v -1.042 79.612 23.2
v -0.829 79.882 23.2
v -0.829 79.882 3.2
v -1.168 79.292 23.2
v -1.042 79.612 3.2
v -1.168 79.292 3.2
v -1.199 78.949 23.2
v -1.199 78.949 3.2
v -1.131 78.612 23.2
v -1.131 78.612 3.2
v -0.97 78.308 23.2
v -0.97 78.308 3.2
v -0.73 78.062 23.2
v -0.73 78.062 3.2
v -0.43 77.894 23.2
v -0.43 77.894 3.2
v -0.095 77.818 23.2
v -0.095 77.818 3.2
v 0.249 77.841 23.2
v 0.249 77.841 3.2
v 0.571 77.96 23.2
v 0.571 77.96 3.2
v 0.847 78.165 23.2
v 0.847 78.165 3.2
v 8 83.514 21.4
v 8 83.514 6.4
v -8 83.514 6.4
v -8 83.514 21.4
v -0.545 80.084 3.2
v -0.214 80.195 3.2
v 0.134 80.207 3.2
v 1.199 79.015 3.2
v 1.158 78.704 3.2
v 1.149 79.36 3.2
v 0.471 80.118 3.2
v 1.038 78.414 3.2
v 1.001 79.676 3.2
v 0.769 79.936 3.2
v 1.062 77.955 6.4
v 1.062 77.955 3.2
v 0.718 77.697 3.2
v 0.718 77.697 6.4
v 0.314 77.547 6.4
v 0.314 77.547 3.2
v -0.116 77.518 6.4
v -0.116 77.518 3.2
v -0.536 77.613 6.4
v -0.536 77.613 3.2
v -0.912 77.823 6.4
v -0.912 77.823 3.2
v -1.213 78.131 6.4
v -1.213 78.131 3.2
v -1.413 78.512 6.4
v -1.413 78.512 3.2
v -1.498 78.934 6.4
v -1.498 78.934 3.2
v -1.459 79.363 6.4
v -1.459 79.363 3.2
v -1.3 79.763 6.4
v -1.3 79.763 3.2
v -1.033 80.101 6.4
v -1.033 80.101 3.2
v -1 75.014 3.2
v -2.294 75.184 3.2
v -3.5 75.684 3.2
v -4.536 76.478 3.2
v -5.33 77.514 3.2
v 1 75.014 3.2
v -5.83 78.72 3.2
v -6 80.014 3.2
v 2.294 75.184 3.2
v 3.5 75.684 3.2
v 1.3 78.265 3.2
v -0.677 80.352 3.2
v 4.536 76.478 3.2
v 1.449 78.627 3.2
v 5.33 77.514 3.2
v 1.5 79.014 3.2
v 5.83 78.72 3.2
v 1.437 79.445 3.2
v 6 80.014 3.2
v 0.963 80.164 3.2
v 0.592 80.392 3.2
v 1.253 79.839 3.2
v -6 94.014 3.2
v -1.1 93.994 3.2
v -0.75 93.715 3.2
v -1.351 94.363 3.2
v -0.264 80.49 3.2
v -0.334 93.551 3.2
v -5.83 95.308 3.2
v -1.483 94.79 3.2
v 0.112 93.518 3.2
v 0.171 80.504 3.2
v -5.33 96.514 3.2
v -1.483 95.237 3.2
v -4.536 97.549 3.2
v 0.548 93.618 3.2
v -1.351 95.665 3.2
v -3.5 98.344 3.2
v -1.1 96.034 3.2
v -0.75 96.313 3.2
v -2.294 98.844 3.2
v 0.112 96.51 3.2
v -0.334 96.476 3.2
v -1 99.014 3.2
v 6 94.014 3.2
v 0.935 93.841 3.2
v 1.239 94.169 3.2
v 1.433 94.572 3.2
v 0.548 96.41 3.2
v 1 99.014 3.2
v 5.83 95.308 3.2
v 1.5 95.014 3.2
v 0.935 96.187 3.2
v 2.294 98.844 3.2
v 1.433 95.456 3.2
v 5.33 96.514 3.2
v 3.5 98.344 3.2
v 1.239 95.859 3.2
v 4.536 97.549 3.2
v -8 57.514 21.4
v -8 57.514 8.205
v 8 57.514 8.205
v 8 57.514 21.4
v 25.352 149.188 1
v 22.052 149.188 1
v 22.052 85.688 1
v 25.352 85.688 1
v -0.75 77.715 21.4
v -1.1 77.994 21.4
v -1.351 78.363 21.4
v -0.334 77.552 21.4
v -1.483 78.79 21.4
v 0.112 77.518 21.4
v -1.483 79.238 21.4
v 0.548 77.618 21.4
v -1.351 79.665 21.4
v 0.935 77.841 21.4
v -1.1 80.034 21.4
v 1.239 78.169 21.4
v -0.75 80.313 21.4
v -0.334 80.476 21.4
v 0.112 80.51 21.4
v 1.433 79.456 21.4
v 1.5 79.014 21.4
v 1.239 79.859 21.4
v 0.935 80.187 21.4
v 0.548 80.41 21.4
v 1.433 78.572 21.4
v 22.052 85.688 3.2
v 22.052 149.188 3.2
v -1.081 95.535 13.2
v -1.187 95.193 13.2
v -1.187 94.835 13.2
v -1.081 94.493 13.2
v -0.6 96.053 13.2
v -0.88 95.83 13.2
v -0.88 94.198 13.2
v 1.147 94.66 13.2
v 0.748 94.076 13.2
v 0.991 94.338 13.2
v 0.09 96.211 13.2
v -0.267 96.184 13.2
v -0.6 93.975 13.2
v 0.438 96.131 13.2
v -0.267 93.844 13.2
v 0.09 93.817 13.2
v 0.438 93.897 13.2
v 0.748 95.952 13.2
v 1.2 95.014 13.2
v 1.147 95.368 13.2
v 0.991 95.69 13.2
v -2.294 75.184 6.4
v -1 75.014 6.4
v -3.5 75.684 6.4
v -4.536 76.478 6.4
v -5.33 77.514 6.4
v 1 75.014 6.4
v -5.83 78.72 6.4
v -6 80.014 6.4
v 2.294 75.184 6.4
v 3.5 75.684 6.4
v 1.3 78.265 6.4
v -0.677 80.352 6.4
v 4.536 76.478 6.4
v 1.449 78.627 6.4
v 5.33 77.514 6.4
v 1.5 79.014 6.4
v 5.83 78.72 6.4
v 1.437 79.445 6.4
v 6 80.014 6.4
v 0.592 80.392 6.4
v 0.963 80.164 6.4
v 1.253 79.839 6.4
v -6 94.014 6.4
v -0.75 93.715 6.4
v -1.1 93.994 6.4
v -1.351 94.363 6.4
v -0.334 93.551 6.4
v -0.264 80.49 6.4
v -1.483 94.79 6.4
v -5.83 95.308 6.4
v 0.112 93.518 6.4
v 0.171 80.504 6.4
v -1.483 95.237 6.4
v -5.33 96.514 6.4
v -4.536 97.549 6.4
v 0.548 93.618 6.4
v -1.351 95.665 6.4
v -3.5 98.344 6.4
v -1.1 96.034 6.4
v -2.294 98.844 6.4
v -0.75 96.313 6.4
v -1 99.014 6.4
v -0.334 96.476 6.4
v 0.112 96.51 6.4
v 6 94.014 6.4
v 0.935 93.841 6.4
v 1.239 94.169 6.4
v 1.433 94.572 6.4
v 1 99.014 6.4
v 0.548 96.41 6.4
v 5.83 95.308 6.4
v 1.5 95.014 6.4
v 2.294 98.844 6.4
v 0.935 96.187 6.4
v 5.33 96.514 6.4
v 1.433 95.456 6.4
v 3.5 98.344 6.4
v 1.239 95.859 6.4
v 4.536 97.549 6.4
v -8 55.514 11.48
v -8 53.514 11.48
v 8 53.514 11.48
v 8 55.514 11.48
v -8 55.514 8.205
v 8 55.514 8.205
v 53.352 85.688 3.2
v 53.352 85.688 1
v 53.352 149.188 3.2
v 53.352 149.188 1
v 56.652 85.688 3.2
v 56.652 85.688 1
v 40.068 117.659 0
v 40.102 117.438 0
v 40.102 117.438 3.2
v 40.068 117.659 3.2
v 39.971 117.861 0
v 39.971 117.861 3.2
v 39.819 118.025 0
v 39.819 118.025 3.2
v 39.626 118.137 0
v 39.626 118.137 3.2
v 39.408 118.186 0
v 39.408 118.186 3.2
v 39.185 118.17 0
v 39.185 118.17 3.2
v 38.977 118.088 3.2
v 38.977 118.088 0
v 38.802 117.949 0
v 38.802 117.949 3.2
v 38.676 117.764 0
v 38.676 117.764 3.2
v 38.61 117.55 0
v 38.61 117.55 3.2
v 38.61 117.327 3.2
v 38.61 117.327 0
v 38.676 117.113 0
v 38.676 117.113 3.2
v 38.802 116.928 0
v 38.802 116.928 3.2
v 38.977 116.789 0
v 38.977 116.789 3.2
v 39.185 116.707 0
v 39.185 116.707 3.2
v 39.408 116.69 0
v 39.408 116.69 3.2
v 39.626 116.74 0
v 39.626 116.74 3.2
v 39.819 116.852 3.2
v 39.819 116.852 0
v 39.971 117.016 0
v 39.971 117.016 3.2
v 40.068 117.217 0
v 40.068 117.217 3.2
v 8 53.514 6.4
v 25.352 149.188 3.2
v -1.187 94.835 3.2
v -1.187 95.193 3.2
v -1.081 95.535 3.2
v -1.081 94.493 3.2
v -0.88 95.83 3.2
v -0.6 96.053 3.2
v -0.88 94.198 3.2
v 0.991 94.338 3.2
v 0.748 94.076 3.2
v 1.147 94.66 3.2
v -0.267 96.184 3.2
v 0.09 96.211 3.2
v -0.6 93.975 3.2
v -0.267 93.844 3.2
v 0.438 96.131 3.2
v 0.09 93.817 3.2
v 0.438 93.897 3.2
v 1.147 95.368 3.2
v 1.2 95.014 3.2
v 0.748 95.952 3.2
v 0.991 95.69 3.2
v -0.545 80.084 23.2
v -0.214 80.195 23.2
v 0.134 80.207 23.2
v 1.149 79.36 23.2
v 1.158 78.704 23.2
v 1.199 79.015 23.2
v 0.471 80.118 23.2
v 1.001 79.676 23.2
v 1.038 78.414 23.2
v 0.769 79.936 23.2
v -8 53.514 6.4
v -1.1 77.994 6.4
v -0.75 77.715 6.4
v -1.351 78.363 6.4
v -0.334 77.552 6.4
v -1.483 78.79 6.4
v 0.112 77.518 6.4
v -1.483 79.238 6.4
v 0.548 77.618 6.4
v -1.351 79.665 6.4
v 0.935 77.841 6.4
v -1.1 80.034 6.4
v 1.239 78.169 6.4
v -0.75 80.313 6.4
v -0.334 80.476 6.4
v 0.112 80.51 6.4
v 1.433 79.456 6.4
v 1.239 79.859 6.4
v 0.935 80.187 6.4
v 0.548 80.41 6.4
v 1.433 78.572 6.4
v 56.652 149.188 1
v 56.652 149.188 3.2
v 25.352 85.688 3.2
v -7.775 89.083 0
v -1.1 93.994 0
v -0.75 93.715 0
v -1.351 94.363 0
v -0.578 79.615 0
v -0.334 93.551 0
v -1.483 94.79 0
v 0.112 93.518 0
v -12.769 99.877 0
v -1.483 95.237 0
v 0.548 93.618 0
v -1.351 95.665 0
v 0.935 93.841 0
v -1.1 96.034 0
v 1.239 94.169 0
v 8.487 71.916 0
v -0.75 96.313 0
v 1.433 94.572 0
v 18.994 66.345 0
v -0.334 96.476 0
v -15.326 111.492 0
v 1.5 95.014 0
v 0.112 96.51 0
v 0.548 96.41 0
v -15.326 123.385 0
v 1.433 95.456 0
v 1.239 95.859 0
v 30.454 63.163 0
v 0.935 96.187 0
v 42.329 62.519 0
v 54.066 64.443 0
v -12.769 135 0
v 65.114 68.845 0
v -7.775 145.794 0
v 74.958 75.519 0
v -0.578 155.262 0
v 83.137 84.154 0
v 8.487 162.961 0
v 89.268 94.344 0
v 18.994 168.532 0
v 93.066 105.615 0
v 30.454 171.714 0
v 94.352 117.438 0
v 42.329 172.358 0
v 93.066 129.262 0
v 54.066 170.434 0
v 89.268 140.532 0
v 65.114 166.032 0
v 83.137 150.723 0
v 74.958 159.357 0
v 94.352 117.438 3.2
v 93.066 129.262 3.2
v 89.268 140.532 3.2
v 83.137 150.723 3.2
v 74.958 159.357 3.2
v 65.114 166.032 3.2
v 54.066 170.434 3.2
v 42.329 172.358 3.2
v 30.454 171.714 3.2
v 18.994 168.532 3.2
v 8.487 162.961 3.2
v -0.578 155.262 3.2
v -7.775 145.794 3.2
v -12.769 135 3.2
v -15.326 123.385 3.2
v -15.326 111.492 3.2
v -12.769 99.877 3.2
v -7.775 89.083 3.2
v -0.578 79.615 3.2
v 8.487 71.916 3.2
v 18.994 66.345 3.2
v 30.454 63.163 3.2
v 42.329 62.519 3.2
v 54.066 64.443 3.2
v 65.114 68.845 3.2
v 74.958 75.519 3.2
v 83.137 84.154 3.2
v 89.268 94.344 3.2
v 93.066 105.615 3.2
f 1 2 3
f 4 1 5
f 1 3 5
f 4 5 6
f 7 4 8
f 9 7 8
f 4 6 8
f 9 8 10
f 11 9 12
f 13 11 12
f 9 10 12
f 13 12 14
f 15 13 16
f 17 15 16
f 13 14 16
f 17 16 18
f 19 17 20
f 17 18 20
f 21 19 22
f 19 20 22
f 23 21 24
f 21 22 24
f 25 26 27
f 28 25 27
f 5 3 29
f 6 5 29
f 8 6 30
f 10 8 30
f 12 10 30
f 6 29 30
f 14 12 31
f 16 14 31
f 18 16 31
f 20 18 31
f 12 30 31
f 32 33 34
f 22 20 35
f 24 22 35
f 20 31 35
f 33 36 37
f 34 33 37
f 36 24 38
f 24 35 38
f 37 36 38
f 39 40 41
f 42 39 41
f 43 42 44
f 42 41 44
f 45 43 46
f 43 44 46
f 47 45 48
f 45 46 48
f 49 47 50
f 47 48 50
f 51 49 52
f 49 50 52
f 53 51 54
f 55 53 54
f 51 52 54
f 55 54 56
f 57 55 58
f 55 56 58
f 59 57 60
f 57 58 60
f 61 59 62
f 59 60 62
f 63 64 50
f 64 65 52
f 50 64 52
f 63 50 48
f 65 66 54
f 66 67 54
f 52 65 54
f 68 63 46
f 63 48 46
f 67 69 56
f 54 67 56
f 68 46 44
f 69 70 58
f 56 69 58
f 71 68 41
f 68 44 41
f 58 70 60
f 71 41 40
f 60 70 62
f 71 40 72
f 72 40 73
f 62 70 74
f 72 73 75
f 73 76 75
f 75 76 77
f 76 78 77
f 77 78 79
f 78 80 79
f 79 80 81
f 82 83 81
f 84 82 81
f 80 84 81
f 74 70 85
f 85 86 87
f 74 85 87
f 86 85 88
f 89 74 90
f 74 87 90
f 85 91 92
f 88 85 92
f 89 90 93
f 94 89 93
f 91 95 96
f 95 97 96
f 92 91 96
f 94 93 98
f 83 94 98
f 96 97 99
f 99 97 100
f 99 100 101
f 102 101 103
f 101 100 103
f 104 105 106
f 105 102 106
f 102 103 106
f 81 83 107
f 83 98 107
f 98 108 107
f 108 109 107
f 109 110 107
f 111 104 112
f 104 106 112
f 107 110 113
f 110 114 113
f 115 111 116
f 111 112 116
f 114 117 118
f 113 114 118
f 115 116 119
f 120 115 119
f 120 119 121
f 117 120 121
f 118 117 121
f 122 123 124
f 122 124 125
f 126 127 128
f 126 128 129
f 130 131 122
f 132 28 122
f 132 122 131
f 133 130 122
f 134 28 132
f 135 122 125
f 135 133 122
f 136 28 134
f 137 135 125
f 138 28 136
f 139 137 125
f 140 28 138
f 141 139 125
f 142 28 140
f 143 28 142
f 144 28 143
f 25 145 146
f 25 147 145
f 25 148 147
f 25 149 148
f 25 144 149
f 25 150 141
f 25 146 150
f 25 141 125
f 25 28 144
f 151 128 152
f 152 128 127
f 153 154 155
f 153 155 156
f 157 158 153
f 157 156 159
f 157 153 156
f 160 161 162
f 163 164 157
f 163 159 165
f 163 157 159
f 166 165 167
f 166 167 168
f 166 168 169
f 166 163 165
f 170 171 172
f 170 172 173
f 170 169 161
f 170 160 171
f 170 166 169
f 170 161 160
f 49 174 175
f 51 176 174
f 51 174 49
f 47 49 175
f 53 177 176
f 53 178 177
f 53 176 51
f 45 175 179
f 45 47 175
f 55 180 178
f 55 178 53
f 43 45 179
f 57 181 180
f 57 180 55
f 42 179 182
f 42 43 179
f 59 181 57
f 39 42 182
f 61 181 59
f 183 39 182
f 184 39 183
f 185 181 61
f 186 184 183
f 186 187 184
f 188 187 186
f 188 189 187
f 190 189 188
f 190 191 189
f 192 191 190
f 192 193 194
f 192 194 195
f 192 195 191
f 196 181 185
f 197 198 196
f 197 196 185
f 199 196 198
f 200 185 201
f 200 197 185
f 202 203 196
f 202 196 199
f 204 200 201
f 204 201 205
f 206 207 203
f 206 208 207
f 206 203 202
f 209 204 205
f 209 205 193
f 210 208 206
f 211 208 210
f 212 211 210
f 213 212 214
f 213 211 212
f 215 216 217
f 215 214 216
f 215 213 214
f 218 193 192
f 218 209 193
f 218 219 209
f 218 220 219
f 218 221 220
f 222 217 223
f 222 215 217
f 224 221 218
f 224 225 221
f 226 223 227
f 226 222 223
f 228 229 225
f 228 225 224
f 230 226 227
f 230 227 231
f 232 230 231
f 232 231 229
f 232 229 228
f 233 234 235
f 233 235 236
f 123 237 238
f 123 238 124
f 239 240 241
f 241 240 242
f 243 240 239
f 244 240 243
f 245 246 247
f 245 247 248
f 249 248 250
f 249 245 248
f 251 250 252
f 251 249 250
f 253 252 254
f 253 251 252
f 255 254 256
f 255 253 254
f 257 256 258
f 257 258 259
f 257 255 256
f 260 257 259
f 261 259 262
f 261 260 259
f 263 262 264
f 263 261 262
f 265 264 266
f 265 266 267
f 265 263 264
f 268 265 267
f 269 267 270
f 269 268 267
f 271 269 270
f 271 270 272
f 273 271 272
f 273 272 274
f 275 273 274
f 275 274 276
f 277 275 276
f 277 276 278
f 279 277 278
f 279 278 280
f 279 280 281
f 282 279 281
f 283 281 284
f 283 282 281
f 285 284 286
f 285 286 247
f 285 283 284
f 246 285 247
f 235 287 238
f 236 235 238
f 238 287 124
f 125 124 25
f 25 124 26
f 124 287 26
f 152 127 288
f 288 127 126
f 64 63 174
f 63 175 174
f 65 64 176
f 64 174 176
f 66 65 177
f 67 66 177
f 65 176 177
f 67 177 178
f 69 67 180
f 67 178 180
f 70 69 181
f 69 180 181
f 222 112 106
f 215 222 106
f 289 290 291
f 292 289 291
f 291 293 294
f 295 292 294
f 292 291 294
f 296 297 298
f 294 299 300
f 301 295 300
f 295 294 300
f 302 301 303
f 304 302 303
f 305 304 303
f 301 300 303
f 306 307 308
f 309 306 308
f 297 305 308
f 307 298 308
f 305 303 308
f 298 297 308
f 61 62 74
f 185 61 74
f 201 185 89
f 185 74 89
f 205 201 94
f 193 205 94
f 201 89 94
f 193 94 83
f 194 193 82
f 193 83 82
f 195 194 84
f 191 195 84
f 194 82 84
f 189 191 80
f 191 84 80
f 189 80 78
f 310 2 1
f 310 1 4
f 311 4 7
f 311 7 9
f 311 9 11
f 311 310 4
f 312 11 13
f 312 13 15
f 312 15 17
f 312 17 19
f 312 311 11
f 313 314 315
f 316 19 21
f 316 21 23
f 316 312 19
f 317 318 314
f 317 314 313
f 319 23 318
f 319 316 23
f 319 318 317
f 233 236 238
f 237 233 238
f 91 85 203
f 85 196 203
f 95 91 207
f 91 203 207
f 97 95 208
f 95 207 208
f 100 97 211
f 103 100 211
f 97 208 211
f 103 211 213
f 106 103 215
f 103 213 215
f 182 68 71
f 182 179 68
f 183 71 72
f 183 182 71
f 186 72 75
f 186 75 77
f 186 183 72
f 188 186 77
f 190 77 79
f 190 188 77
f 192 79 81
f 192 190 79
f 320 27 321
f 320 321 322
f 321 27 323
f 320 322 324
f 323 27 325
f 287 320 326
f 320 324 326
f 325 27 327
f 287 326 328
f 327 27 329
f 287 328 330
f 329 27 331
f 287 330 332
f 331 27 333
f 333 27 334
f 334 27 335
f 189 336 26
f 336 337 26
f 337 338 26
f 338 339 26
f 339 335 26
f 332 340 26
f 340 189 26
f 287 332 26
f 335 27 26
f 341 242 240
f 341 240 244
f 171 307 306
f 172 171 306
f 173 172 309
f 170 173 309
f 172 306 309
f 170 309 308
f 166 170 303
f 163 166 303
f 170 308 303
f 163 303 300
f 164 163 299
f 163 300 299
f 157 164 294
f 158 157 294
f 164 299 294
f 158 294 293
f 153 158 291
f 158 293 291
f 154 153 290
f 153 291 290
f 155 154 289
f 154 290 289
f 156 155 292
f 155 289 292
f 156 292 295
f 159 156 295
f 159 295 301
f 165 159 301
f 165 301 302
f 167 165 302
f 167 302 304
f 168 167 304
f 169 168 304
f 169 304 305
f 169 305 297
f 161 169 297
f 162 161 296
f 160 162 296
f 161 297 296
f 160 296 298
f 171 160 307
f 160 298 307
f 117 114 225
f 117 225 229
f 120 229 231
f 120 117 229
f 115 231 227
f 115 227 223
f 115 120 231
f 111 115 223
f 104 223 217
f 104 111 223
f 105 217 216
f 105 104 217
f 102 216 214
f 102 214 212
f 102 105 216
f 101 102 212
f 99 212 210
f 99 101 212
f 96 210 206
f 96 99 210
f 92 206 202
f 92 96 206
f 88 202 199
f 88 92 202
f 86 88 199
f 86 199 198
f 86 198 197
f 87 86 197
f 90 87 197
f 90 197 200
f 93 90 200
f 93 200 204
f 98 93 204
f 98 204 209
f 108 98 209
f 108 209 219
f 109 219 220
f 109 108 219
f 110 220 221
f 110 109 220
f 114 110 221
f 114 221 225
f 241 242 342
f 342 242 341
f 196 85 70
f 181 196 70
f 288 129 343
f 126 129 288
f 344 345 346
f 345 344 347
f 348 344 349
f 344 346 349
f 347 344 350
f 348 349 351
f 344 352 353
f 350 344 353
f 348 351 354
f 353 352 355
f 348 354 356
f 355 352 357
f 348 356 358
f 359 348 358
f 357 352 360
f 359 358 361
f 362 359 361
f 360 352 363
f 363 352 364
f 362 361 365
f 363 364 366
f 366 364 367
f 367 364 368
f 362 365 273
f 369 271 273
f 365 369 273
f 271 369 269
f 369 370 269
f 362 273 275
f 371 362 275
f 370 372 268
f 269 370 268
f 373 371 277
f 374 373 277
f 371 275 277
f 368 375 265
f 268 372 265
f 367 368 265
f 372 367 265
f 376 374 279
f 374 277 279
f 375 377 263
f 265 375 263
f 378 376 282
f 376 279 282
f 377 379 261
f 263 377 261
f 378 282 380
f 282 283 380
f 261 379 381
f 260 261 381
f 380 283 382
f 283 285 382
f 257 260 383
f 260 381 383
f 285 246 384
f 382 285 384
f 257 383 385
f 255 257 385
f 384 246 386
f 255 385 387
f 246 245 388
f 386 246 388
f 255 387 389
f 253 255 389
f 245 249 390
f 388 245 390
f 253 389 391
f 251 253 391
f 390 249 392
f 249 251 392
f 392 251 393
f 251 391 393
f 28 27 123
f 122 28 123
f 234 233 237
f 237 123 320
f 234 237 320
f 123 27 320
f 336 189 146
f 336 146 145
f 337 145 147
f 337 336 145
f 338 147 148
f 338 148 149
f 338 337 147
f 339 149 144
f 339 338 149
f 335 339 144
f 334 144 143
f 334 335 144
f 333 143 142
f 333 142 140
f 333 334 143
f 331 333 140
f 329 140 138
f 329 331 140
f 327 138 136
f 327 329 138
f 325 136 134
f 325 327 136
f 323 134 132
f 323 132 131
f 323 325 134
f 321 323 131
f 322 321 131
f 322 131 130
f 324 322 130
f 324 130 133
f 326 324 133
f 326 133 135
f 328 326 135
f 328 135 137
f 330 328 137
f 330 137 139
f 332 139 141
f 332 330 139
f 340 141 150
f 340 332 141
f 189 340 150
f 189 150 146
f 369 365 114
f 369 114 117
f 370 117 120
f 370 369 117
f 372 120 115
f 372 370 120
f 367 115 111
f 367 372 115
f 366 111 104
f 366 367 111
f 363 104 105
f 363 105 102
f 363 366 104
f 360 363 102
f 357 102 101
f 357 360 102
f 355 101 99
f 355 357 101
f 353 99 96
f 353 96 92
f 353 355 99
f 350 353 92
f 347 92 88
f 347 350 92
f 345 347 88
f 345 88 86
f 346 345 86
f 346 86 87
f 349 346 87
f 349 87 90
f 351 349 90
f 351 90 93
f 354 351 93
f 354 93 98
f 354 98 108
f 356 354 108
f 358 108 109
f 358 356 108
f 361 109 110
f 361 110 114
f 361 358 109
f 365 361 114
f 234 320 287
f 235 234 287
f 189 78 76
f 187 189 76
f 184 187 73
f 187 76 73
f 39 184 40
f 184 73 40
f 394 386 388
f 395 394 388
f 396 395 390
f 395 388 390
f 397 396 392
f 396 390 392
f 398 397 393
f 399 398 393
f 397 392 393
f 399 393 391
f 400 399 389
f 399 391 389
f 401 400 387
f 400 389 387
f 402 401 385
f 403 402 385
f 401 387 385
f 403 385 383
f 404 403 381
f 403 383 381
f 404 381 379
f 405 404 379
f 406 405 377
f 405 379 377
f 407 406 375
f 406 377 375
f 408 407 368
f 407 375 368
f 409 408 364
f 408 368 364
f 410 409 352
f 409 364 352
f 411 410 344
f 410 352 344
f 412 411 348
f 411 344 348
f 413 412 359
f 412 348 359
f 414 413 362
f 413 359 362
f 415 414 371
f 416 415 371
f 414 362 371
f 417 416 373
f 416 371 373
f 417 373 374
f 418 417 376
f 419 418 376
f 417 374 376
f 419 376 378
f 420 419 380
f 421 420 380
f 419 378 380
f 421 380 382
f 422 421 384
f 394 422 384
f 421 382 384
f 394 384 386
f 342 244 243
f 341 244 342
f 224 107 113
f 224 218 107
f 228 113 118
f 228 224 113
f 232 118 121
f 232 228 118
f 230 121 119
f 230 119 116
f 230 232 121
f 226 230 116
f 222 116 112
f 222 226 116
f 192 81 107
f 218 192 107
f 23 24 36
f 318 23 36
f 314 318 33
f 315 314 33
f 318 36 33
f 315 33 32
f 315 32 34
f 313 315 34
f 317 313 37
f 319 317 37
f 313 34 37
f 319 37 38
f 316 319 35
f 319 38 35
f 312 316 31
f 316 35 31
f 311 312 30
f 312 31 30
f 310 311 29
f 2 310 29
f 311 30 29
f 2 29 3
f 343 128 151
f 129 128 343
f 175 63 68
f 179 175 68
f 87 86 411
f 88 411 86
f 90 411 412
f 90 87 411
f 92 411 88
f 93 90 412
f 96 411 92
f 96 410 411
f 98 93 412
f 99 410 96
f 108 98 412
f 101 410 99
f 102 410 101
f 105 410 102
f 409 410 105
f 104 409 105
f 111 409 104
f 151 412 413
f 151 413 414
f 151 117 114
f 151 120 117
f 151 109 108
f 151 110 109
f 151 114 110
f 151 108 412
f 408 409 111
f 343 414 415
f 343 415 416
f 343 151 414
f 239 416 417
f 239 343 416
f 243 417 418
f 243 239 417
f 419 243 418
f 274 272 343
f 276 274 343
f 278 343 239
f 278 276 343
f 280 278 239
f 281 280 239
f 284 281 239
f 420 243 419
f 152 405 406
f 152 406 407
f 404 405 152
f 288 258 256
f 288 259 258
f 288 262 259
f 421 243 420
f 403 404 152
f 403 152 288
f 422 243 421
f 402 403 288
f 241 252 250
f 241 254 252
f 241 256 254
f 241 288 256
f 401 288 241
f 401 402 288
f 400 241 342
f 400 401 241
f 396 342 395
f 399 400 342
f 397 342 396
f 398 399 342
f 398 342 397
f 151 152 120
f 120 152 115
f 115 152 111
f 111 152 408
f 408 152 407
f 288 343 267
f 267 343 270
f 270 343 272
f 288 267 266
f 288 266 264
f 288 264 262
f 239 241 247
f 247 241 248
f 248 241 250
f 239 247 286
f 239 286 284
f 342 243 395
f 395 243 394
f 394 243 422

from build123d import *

# Parameters (mm, degrees)
F0_R      = 55
F0_R_2    = 1.5
F0_W      = 3.3
F0_H      = 63.5
F0_R_3    = 0.75
F1_DEPTH  = 3.2
F2_DEPTH  = 1
F3_R      = 1.2
F4_DEPTH  = 10
F5_R      = 1.5
F6_DEPTH  = 3.2
F7_R      = 5
F9_DEPTH  = 20
F10_R     = 1.5
F11_DEPTH = 15
F13_DEPTH = 25


with BuildPart() as f1:
    # F0 (on Top) → F1 (new body)
    with BuildSketch(Plane.XY):
        with Locations((39.351791, 117.438398)):
            Circle(F0_R)
        with Locations((0, 95.013872)):
            Circle(F0_R_2, mode=Mode.SUBTRACT)
        with Locations((23.701791, 117.438398)):
            Rectangle(F0_W, F0_H, mode=Mode.SUBTRACT)
        with Locations((39.351791, 117.438398)):
            Circle(F0_R_3, mode=Mode.SUBTRACT)
        with Locations((55.001791, 117.438398)):
            Rectangle(F0_W, F0_H, mode=Mode.SUBTRACT)
    extrude(amount=F1_DEPTH)

    # F0 (on Top) → F2 (join)
    with BuildSketch(Plane.XY):
        with Locations((23.701791, 117.438398)):
            Rectangle(F0_W, F0_H)
        with Locations((55.001791, 117.438398)):
            Rectangle(F0_W, F0_H)
    extrude(amount=F2_DEPTH)


with BuildPart() as f4:
    # F3 (on face) → F4 (new body)
    with BuildSketch(Plane.XY.offset(3.2)):
        with Locations((0, 95.013872)):
            Circle(F3_R)
    extrude(amount=F4_DEPTH)


with BuildPart() as f6:
    # F5 (on face) → F6 (new body)
    with BuildSketch(Plane.XY.offset(3.2)):
        with BuildLine():
            ThreePointArc((-1.033206, 80.101393), (-3.629298, 83.121842), (-6, 86.322244))
            Line((-6, 86.322244), (-6, 75.013872))
            Line((-6, 75.013872), (4.349512, 75.013872))
            ThreePointArc((4.349512, 75.013872), (2.676497, 76.451537), (1.062476, 77.955131))
            ThreePointArc((1.062476, 77.955131), (-1.073231, 77.966033), (-1.033206, 80.101393))
        make_face()
        with BuildLine():
            Line((6, 99.013872), (-6, 99.013872))
            Line((-6, 99.013872), (-6, 86.322244))
            ThreePointArc((-6, 86.322244), (-3.629298, 83.121842), (-1.033206, 80.101393))
            ThreePointArc((-1.033206, 80.101393), (0.591688, 80.392342), (1.5, 79.013972))
            ThreePointArc((1.5, 79.013972), (1.386311, 78.441135), (1.062476, 77.955131))
            ThreePointArc((1.062476, 77.955131), (2.676497, 76.451537), (4.349512, 75.013872))
            Line((4.349512, 75.013872), (6, 75.013872))
            Line((6, 75.013872), (6, 99.013872))
        make_face()
        with Locations((0, 95.013872)):
            Circle(F5_R, mode=Mode.SUBTRACT)
    extrude(amount=F6_DEPTH)

    # F7
    f7_edges = [f6.edges().sort_by_distance(p)[0] for p in [
        (-6, 99.013872, 4.8),
        (6, 99.013872, 4.8),
        (6, 75.013872, 4.8),
        (-6, 75.013872, 4.8),
    ]]
    fillet(f7_edges, radius=F7_R)


with BuildPart() as f9:
    # F8 (on face) → F9 (new body)
    with BuildSketch(Plane.XY.offset(3.2)):
        with BuildLine():
            ThreePointArc((0.847086, 78.165155), (1.10785, 78.554765), (1.199431, 79.014555))
            ThreePointArc((1.199431, 79.014555), (0.471285, 80.117892), (-0.829491, 79.882246))
            ThreePointArc((-0.829491, 79.882246), (-0.000569, 79.014555), (0.847086, 78.165155))
        make_face()
        with BuildLine():
            ThreePointArc((0.847086, 78.165155), (-0.000569, 79.014555), (-0.829491, 79.882246))
            ThreePointArc((-0.829491, 79.882246), (-0.859166, 78.176217), (0.847086, 78.165155))
        make_face()
    extrude(amount=F9_DEPTH)


with BuildPart() as f11:
    # F10 (on face) → F11 (new body)
    with BuildSketch(Plane.XY.offset(6.4)):
        with BuildLine():
            Line((-6, 83.513972), (-8, 83.513972))
            Line((-8, 83.513972), (-8, 53.513972))
            Line((-8, 53.513972), (8, 53.513972))
            Line((8, 53.513972), (8, 83.513972))
            Line((8, 83.513972), (6, 83.513972))
            Line((6, 83.513972), (6, 80.013872))
            ThreePointArc((6, 80.013872), (4.535534, 76.478338), (1, 75.013872))
            Line((1, 75.013872), (-1, 75.013872))
            ThreePointArc((-1, 75.013872), (-4.535534, 76.478338), (-6, 80.013872))
            Line((-6, 80.013872), (-6, 83.513972))
        make_face()
        with BuildLine():
            Line((6, 83.513972), (-6, 83.513972))
            Line((-6, 83.513972), (-6, 80.013872))
            ThreePointArc((-6, 80.013872), (-4.535534, 76.478338), (-1, 75.013872))
            Line((-1, 75.013872), (1, 75.013872))
            ThreePointArc((1, 75.013872), (4.535534, 76.478338), (6, 80.013872))
            Line((6, 80.013872), (6, 83.513972))
        make_face()
        with Locations((0, 79.013972)):
            Circle(F10_R, mode=Mode.SUBTRACT)
    extrude(amount=F11_DEPTH)

    # F12 (on face) → F13 (cut)
    with BuildSketch(Plane.YZ.offset(8)):
        Polygon((57.513972, 21.4), (53.513972, 21.4), (53.513972, 11.47974), (55.513972, 11.47974), (55.513972, 8.205), (57.513972, 8.205), align=None)
    extrude(amount=-F13_DEPTH, mode=Mode.SUBTRACT)


solid = Compound([f1.part, f4.part, f6.part, f9.part, f11.part])
